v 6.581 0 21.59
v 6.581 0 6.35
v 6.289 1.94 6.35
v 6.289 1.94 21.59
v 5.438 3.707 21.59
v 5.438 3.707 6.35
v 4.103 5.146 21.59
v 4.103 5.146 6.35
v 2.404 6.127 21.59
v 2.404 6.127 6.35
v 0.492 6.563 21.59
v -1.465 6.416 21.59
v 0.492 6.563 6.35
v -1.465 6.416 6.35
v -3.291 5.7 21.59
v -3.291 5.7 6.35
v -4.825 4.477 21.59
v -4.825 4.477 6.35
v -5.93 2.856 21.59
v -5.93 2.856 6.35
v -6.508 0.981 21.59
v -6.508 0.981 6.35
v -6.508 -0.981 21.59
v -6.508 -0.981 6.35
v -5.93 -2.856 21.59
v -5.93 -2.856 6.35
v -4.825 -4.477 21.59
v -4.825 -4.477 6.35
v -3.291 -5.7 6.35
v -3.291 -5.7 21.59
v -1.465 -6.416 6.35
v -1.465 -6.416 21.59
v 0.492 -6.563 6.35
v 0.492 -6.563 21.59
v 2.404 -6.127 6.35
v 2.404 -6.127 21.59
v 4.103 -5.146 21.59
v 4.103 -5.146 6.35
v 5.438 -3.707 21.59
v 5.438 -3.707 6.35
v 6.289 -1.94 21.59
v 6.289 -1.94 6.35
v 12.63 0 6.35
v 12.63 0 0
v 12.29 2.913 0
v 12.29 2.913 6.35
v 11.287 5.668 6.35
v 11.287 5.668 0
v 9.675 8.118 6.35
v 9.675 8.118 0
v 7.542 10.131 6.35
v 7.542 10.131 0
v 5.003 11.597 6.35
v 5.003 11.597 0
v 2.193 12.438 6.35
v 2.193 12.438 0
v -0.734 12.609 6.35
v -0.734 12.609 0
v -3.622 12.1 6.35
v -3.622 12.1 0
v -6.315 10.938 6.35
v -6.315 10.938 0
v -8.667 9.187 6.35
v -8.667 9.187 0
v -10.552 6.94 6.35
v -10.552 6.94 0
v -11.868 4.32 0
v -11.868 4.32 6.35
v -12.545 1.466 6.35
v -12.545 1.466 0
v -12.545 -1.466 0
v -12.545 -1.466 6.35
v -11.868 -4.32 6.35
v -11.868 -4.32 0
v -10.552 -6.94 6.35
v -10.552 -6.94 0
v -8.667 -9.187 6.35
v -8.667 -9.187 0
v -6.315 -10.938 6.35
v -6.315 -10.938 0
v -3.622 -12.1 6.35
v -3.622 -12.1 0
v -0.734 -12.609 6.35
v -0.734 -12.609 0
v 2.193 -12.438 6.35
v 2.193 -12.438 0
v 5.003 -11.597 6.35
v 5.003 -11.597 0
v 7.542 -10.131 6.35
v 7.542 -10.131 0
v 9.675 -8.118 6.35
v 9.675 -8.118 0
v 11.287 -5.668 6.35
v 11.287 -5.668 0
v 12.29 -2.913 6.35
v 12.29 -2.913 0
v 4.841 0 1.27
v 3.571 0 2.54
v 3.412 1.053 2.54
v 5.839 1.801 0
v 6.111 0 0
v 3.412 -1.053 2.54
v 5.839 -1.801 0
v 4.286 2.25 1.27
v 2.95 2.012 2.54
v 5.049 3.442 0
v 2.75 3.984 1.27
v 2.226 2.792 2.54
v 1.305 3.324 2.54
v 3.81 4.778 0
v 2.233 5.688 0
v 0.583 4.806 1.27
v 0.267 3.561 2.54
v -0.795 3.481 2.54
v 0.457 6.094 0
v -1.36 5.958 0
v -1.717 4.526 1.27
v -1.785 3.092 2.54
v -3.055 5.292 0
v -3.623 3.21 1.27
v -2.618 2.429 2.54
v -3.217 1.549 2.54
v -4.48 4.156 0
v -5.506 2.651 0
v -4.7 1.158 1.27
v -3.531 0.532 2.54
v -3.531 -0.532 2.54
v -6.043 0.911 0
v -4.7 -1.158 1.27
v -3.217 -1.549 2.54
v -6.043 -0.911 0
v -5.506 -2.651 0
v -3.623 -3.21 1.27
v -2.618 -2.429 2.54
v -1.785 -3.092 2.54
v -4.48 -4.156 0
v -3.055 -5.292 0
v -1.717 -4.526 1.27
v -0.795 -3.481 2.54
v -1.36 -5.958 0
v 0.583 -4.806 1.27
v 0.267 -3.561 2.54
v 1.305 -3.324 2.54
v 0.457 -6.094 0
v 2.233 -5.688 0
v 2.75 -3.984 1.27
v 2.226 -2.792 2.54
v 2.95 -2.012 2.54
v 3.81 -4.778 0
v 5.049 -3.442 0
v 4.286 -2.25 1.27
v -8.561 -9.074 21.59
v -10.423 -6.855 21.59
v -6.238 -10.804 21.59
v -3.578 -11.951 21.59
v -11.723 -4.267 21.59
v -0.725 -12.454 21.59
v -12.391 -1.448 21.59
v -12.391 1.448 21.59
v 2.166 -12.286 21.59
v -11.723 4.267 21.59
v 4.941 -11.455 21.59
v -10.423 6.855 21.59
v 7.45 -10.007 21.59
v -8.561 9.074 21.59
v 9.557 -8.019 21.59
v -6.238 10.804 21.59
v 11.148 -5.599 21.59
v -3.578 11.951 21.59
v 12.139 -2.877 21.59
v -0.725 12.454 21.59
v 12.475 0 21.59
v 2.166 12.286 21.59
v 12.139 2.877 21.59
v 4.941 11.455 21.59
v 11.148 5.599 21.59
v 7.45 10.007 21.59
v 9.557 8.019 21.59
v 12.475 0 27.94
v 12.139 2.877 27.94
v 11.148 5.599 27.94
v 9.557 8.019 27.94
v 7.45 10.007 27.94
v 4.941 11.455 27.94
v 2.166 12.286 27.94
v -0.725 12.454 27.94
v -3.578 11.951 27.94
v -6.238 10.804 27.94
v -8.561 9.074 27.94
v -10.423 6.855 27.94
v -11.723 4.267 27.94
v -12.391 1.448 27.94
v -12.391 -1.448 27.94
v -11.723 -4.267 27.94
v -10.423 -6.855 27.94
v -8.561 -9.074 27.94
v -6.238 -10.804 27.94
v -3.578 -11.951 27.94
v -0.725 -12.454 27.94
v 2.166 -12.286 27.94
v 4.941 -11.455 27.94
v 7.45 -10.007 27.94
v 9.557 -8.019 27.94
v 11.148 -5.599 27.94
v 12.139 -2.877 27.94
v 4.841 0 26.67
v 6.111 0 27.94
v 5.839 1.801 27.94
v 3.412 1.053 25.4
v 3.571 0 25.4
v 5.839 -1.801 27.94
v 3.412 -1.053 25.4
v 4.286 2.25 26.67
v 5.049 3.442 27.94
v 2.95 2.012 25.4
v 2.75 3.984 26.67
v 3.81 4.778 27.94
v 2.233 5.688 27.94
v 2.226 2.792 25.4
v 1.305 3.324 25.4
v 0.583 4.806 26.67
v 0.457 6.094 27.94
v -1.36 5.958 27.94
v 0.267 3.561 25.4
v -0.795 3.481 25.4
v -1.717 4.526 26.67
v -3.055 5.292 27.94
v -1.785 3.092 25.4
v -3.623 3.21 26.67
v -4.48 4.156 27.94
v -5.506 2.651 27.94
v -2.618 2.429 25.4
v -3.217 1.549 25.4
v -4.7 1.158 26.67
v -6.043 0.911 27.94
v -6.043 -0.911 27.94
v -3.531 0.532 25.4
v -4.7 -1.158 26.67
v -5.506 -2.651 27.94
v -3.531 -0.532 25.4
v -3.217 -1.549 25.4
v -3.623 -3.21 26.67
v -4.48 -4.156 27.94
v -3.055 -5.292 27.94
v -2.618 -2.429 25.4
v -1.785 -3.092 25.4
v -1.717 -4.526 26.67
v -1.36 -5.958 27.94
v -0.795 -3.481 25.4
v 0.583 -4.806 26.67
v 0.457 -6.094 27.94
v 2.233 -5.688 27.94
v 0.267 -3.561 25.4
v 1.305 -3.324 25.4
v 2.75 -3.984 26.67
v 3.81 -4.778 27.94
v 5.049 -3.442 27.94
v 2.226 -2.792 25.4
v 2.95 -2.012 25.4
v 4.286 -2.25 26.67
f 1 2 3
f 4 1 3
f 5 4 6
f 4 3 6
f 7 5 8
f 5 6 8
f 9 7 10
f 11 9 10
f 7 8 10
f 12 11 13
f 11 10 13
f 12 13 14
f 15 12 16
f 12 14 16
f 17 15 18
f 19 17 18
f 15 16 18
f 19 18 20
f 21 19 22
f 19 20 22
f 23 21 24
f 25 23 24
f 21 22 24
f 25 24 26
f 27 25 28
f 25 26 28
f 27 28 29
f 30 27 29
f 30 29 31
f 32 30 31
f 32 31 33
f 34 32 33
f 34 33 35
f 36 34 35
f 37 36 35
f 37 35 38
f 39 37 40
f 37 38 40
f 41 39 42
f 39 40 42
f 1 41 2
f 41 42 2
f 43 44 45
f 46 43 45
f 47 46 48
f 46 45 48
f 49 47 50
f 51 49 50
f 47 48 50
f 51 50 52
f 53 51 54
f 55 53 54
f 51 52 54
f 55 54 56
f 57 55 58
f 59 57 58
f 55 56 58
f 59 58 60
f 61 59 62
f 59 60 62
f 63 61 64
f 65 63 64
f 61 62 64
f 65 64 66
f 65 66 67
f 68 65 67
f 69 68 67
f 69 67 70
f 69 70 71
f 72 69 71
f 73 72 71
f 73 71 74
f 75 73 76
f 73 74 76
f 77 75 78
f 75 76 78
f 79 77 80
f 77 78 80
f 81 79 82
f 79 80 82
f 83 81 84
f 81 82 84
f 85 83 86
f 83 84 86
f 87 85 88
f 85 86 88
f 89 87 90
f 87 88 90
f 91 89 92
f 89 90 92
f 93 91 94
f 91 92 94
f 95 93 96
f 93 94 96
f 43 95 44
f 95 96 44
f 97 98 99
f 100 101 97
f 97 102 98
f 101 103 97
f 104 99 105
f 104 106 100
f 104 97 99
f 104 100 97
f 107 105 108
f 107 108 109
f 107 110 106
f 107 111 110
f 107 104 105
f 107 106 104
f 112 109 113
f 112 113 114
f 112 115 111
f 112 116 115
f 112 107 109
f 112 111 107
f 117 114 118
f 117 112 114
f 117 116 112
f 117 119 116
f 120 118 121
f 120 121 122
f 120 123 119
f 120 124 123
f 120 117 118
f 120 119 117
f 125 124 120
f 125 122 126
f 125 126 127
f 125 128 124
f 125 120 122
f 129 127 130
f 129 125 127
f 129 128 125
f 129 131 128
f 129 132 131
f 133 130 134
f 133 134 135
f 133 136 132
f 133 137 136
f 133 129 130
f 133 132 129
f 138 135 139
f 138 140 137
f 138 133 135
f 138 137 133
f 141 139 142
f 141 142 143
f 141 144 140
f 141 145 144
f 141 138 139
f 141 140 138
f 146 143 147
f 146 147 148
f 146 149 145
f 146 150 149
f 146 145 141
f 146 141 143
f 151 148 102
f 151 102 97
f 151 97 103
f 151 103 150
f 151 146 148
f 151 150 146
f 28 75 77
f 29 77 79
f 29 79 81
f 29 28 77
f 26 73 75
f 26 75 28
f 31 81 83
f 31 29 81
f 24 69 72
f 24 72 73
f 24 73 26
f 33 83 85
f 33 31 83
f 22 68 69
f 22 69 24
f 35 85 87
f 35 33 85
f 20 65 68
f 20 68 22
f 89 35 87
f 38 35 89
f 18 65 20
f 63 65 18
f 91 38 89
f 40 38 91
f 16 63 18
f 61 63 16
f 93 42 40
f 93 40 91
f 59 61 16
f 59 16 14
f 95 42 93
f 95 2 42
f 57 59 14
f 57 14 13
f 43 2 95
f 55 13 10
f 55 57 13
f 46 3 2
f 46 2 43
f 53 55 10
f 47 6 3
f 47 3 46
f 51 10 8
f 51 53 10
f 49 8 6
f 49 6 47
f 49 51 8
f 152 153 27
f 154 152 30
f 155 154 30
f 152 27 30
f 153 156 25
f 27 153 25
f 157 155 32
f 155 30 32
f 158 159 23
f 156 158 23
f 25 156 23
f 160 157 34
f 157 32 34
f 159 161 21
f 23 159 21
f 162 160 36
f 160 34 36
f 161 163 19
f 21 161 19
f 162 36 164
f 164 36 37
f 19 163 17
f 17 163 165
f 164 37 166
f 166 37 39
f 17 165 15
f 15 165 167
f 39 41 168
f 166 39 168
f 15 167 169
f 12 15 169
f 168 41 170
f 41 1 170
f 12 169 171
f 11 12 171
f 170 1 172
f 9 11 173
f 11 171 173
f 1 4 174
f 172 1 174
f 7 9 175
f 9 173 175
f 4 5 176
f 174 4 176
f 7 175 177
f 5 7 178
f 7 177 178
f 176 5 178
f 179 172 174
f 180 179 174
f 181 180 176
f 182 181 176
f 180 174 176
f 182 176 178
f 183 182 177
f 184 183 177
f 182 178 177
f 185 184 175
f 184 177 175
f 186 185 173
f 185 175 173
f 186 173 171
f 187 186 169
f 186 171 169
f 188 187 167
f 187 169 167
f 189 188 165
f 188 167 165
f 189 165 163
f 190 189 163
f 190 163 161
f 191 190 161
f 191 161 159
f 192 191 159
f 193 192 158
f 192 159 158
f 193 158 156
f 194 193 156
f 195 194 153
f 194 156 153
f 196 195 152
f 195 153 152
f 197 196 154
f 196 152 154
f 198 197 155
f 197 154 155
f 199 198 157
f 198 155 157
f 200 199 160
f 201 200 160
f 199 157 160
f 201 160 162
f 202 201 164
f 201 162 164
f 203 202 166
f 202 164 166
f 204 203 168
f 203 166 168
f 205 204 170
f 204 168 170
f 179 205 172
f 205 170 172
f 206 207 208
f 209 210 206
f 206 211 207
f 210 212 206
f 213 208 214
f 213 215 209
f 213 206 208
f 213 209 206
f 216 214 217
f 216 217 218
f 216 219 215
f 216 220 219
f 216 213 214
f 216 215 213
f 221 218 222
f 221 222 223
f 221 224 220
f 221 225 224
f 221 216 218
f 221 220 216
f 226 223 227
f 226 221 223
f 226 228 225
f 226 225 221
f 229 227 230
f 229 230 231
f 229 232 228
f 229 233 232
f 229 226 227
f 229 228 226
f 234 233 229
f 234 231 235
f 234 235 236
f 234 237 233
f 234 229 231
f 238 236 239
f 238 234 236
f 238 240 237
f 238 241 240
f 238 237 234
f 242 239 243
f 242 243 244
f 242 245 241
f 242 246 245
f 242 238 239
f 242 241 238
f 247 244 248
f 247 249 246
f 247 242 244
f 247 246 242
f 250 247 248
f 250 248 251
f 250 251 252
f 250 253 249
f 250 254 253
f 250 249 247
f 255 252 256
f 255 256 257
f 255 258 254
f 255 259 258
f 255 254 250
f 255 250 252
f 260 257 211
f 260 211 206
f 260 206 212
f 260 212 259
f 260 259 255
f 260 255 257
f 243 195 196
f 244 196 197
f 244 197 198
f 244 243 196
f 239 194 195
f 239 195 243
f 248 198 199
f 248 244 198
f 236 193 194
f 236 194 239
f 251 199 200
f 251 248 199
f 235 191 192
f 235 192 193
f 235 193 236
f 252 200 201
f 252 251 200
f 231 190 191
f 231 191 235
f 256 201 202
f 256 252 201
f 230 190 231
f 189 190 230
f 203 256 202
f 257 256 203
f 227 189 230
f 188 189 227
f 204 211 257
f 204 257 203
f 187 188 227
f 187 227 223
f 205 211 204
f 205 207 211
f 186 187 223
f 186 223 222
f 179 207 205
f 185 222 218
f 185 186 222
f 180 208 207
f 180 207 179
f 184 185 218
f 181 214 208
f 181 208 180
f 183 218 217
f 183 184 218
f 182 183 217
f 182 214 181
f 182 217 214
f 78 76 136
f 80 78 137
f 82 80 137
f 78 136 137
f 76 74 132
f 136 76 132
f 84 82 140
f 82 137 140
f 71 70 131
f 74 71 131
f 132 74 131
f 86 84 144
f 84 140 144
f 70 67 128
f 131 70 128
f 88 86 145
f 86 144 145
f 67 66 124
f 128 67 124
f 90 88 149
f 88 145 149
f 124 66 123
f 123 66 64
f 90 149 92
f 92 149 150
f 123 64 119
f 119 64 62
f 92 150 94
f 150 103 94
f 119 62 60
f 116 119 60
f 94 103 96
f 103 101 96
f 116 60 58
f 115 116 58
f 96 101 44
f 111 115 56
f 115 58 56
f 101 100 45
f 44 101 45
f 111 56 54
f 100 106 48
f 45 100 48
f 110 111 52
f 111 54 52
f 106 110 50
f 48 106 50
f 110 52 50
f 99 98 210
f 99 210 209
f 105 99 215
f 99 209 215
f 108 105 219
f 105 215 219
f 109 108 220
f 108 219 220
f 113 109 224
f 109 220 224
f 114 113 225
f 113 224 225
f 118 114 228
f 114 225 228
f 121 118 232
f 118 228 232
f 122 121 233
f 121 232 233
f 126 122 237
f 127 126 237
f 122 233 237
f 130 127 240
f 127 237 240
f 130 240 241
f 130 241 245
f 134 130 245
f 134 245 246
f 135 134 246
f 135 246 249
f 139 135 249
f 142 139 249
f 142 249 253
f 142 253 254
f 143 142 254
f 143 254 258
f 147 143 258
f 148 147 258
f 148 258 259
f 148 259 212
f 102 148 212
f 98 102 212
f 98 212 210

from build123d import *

# Parameters (mm, degrees)
F0_R     = 12.630129
F1_DEPTH = 6.35
F2_R     = 6.581493
F3_DEPTH = 15.24
F4_R     = 12.475408
F5_DEPTH = 6.35
F6_R     = 3.570848
F7_DEPTH = 27.941
F8_SIZE  = 2.54


with BuildPart() as f1:
    # F0 (on Top) → F1 (new body)
    with BuildSketch(Plane.XY):
        Circle(F0_R)
    extrude(amount=F1_DEPTH)

    # F2 (on face) → F3 (join)
    with BuildSketch(Plane.XY.offset(6.35)):
        Circle(F2_R)
    extrude(amount=F3_DEPTH)

    # F4 (on face) → F5 (join)
    with BuildSketch(Plane.XY.offset(21.59)):
        Circle(F4_R)
    extrude(amount=F5_DEPTH)

    # F6 (on face) → F7 (cut, through all)
    with BuildSketch(Plane.XY.offset(27.94)):
        Circle(F6_R)
    extrude(amount=-F7_DEPTH, mode=Mode.SUBTRACT)

    # F8
    f8_edges = [f1.edges().sort_by_distance(p)[0] for p in [
        (-3.570848, 0, 27.94),
        (-3.570848, 0, 0),
    ]]
    chamfer(f8_edges, length=F8_SIZE)


solid = f1.part
